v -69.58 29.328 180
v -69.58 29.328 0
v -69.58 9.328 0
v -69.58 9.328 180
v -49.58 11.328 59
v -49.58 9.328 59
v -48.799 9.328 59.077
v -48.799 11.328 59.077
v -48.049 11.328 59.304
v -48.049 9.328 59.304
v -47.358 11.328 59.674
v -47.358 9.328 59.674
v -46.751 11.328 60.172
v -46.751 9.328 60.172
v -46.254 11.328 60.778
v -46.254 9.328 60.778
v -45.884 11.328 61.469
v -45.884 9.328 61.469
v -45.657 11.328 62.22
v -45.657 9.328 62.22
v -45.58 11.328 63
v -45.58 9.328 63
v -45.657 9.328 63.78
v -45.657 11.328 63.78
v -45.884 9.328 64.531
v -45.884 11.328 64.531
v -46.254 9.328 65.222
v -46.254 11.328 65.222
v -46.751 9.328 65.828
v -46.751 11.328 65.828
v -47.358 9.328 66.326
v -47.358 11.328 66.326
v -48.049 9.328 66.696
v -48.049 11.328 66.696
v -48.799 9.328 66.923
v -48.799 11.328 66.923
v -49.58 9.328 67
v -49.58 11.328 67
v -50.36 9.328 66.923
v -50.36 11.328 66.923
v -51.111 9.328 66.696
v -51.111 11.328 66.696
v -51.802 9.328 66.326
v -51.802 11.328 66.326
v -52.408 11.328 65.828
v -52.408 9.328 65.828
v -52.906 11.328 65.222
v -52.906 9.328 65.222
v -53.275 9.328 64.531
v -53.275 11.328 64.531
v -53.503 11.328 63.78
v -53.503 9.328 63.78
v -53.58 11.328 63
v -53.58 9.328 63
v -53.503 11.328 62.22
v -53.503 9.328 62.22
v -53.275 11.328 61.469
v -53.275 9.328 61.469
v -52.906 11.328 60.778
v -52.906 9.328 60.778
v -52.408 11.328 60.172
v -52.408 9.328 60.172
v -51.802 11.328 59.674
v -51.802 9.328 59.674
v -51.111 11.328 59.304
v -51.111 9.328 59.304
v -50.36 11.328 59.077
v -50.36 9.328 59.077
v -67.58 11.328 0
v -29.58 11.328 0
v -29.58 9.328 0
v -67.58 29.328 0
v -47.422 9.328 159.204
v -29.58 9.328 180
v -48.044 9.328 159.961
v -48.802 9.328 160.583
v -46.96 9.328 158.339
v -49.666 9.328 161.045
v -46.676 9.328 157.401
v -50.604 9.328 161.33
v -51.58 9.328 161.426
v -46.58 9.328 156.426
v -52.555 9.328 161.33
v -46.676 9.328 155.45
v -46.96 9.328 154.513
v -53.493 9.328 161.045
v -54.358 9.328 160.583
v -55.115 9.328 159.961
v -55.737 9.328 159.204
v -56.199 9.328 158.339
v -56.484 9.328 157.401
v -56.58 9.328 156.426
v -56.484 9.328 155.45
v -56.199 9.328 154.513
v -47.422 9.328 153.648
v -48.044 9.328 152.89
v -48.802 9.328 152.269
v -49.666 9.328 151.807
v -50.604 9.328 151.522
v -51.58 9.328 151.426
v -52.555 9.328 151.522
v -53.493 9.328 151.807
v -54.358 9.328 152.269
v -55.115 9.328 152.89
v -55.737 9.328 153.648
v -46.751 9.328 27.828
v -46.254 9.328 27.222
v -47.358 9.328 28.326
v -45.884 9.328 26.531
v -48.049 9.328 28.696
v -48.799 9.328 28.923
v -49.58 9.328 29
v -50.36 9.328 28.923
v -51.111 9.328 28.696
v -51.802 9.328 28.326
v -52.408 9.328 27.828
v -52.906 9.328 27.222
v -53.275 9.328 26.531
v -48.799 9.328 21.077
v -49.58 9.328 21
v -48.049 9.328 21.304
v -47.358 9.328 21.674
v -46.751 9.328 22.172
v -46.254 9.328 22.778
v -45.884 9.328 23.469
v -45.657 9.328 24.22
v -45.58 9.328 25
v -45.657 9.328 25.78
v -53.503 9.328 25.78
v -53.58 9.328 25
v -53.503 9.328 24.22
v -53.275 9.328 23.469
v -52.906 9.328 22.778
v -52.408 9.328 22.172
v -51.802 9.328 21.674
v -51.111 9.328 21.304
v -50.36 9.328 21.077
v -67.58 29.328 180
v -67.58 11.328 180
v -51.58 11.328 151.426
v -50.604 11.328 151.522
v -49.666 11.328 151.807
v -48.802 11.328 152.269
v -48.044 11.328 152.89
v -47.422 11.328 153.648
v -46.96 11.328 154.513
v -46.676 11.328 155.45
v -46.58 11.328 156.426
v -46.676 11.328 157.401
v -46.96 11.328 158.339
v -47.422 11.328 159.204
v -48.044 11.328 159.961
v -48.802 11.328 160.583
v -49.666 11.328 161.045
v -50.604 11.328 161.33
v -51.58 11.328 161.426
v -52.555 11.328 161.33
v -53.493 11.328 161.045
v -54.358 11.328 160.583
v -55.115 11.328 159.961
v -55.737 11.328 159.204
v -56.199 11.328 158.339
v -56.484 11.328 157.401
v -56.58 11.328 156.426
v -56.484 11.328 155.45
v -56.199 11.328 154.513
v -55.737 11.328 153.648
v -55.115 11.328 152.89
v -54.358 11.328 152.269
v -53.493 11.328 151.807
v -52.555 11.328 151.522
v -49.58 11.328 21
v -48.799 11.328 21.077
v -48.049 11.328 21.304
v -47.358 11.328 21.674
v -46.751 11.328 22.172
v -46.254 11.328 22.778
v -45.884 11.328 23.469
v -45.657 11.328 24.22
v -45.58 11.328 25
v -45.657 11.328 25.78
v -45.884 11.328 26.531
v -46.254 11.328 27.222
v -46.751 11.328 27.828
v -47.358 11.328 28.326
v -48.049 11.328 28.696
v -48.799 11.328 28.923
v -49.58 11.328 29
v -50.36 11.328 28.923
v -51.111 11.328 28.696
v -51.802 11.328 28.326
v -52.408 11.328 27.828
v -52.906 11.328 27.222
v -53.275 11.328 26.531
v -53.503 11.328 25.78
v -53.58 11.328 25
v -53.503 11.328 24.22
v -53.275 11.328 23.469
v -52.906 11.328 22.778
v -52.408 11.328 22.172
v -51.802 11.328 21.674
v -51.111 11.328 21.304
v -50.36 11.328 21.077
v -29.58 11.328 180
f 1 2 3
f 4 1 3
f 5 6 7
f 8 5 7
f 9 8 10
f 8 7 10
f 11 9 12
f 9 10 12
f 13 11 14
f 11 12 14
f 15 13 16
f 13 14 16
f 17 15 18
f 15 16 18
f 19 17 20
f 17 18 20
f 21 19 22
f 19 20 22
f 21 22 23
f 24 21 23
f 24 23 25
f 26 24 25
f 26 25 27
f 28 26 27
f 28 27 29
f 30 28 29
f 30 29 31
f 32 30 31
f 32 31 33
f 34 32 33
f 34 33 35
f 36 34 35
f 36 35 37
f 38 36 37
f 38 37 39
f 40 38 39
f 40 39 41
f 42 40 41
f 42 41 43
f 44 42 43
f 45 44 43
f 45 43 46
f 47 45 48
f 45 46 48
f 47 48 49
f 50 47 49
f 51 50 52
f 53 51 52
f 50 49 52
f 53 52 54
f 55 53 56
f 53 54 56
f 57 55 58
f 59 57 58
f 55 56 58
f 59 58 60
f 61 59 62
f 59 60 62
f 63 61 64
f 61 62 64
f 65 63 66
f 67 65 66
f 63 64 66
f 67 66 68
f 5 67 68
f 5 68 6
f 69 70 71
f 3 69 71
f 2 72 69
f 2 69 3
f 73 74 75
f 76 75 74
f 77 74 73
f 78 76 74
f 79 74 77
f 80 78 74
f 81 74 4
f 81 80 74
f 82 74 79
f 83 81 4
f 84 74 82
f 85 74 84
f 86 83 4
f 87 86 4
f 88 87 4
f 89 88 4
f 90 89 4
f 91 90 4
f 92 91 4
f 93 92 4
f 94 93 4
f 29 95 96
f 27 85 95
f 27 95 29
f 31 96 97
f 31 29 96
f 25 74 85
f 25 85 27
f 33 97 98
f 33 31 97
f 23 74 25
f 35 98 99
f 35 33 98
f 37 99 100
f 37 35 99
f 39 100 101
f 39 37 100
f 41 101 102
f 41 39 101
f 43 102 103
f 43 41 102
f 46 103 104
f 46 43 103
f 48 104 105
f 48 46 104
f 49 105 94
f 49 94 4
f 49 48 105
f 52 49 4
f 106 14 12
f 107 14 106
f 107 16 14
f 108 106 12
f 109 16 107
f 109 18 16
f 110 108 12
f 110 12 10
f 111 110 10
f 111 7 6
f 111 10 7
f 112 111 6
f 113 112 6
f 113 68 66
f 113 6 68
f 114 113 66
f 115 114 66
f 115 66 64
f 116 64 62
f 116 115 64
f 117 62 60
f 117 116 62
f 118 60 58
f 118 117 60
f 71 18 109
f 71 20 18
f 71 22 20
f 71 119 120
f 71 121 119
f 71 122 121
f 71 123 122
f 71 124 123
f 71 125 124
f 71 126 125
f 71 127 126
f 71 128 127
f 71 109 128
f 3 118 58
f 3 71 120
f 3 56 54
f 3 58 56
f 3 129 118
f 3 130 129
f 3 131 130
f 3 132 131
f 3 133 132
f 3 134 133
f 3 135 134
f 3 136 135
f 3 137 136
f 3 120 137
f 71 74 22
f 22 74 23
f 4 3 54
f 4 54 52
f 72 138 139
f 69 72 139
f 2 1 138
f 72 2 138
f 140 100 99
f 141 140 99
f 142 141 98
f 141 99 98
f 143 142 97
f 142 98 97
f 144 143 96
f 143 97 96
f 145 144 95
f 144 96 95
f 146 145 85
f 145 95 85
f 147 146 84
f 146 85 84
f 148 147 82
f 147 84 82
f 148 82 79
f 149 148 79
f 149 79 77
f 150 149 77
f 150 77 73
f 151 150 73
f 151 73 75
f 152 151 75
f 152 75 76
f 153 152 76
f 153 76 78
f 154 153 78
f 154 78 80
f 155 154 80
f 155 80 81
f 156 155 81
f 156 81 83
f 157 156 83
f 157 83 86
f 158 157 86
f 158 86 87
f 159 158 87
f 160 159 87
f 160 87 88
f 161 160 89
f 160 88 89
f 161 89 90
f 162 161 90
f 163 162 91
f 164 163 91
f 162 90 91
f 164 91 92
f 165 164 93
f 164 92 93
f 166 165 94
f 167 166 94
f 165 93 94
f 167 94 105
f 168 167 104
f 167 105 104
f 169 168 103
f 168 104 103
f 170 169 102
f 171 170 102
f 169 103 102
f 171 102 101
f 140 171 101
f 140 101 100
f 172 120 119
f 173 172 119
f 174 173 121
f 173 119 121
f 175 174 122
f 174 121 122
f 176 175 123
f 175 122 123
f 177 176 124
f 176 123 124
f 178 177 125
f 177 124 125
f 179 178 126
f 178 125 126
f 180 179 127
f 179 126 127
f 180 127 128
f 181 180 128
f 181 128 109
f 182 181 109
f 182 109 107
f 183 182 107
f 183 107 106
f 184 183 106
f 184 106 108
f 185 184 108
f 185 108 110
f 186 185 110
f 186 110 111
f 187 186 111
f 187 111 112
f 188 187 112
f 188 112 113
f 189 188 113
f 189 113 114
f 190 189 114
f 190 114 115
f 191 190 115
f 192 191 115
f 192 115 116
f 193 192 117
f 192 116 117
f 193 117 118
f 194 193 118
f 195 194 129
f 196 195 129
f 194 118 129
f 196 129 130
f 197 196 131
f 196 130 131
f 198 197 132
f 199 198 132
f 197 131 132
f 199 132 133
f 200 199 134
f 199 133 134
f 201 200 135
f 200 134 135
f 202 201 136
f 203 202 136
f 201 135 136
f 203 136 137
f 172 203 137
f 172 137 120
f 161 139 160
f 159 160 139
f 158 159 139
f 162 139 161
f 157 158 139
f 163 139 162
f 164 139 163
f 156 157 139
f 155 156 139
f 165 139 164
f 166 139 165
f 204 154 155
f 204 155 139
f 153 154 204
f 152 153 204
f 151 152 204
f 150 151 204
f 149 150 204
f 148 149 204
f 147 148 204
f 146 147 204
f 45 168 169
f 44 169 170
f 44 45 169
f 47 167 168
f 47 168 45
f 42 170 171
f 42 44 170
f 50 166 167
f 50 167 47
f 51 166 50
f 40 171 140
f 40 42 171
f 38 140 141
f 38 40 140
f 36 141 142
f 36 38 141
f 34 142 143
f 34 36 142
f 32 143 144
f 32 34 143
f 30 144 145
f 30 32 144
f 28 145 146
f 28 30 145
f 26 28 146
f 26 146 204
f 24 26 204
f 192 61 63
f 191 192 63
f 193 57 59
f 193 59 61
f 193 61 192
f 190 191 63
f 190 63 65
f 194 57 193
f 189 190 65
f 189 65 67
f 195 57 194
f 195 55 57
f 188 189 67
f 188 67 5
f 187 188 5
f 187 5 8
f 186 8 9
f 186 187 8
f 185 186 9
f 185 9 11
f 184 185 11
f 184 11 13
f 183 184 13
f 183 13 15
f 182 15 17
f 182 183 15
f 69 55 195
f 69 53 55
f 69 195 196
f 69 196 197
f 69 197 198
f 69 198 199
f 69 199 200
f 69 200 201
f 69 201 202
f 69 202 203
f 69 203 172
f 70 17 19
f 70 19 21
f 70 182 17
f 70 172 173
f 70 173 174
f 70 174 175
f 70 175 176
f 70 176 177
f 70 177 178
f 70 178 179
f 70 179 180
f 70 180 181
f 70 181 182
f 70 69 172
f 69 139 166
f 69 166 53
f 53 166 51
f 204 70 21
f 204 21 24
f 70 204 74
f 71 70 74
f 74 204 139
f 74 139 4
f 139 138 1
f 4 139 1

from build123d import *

# Parameters (mm, degrees)
BOSS_EXTRUDE1_DEPTH = 180
SKETCH3_R           = 4
SKETCH3_R_2         = 5
CUT_EXTRUDE1_DEPTH  = 10


with BuildPart() as part:
    # Sketch1 → Boss-Extrude1 (new body)
    with BuildSketch(Plane.XY):
        Polygon((-69.579831933, 29.327731092), (-67.579831933, 29.327731092), (-67.579831933, 11.327731092), (-29.579831933, 11.327731092), (-29.579831933, 9.327731092), (-69.579831933, 9.327731092), (-69.579831933, 11.327731092), align=None)
    extrude(amount=BOSS_EXTRUDE1_DEPTH)

    # Sketch3 → Cut-Extrude1 (cut)
    with BuildSketch(Plane.XZ.offset(-9.327731092)):
        with Locations(Location((-49.579831933, 63, 0), (0, 0, 270))):
            Circle(SKETCH3_R)
        with Locations(Location((-49.579831933, 25, 0), (0, 0, 270))):
            Circle(SKETCH3_R)
        with Locations(Location((-51.579831933, 156.42594511, 0), (0, 0, 270))):
            Circle(SKETCH3_R_2)
    extrude(amount=-CUT_EXTRUDE1_DEPTH, mode=Mode.SUBTRACT)


solid = part.part
